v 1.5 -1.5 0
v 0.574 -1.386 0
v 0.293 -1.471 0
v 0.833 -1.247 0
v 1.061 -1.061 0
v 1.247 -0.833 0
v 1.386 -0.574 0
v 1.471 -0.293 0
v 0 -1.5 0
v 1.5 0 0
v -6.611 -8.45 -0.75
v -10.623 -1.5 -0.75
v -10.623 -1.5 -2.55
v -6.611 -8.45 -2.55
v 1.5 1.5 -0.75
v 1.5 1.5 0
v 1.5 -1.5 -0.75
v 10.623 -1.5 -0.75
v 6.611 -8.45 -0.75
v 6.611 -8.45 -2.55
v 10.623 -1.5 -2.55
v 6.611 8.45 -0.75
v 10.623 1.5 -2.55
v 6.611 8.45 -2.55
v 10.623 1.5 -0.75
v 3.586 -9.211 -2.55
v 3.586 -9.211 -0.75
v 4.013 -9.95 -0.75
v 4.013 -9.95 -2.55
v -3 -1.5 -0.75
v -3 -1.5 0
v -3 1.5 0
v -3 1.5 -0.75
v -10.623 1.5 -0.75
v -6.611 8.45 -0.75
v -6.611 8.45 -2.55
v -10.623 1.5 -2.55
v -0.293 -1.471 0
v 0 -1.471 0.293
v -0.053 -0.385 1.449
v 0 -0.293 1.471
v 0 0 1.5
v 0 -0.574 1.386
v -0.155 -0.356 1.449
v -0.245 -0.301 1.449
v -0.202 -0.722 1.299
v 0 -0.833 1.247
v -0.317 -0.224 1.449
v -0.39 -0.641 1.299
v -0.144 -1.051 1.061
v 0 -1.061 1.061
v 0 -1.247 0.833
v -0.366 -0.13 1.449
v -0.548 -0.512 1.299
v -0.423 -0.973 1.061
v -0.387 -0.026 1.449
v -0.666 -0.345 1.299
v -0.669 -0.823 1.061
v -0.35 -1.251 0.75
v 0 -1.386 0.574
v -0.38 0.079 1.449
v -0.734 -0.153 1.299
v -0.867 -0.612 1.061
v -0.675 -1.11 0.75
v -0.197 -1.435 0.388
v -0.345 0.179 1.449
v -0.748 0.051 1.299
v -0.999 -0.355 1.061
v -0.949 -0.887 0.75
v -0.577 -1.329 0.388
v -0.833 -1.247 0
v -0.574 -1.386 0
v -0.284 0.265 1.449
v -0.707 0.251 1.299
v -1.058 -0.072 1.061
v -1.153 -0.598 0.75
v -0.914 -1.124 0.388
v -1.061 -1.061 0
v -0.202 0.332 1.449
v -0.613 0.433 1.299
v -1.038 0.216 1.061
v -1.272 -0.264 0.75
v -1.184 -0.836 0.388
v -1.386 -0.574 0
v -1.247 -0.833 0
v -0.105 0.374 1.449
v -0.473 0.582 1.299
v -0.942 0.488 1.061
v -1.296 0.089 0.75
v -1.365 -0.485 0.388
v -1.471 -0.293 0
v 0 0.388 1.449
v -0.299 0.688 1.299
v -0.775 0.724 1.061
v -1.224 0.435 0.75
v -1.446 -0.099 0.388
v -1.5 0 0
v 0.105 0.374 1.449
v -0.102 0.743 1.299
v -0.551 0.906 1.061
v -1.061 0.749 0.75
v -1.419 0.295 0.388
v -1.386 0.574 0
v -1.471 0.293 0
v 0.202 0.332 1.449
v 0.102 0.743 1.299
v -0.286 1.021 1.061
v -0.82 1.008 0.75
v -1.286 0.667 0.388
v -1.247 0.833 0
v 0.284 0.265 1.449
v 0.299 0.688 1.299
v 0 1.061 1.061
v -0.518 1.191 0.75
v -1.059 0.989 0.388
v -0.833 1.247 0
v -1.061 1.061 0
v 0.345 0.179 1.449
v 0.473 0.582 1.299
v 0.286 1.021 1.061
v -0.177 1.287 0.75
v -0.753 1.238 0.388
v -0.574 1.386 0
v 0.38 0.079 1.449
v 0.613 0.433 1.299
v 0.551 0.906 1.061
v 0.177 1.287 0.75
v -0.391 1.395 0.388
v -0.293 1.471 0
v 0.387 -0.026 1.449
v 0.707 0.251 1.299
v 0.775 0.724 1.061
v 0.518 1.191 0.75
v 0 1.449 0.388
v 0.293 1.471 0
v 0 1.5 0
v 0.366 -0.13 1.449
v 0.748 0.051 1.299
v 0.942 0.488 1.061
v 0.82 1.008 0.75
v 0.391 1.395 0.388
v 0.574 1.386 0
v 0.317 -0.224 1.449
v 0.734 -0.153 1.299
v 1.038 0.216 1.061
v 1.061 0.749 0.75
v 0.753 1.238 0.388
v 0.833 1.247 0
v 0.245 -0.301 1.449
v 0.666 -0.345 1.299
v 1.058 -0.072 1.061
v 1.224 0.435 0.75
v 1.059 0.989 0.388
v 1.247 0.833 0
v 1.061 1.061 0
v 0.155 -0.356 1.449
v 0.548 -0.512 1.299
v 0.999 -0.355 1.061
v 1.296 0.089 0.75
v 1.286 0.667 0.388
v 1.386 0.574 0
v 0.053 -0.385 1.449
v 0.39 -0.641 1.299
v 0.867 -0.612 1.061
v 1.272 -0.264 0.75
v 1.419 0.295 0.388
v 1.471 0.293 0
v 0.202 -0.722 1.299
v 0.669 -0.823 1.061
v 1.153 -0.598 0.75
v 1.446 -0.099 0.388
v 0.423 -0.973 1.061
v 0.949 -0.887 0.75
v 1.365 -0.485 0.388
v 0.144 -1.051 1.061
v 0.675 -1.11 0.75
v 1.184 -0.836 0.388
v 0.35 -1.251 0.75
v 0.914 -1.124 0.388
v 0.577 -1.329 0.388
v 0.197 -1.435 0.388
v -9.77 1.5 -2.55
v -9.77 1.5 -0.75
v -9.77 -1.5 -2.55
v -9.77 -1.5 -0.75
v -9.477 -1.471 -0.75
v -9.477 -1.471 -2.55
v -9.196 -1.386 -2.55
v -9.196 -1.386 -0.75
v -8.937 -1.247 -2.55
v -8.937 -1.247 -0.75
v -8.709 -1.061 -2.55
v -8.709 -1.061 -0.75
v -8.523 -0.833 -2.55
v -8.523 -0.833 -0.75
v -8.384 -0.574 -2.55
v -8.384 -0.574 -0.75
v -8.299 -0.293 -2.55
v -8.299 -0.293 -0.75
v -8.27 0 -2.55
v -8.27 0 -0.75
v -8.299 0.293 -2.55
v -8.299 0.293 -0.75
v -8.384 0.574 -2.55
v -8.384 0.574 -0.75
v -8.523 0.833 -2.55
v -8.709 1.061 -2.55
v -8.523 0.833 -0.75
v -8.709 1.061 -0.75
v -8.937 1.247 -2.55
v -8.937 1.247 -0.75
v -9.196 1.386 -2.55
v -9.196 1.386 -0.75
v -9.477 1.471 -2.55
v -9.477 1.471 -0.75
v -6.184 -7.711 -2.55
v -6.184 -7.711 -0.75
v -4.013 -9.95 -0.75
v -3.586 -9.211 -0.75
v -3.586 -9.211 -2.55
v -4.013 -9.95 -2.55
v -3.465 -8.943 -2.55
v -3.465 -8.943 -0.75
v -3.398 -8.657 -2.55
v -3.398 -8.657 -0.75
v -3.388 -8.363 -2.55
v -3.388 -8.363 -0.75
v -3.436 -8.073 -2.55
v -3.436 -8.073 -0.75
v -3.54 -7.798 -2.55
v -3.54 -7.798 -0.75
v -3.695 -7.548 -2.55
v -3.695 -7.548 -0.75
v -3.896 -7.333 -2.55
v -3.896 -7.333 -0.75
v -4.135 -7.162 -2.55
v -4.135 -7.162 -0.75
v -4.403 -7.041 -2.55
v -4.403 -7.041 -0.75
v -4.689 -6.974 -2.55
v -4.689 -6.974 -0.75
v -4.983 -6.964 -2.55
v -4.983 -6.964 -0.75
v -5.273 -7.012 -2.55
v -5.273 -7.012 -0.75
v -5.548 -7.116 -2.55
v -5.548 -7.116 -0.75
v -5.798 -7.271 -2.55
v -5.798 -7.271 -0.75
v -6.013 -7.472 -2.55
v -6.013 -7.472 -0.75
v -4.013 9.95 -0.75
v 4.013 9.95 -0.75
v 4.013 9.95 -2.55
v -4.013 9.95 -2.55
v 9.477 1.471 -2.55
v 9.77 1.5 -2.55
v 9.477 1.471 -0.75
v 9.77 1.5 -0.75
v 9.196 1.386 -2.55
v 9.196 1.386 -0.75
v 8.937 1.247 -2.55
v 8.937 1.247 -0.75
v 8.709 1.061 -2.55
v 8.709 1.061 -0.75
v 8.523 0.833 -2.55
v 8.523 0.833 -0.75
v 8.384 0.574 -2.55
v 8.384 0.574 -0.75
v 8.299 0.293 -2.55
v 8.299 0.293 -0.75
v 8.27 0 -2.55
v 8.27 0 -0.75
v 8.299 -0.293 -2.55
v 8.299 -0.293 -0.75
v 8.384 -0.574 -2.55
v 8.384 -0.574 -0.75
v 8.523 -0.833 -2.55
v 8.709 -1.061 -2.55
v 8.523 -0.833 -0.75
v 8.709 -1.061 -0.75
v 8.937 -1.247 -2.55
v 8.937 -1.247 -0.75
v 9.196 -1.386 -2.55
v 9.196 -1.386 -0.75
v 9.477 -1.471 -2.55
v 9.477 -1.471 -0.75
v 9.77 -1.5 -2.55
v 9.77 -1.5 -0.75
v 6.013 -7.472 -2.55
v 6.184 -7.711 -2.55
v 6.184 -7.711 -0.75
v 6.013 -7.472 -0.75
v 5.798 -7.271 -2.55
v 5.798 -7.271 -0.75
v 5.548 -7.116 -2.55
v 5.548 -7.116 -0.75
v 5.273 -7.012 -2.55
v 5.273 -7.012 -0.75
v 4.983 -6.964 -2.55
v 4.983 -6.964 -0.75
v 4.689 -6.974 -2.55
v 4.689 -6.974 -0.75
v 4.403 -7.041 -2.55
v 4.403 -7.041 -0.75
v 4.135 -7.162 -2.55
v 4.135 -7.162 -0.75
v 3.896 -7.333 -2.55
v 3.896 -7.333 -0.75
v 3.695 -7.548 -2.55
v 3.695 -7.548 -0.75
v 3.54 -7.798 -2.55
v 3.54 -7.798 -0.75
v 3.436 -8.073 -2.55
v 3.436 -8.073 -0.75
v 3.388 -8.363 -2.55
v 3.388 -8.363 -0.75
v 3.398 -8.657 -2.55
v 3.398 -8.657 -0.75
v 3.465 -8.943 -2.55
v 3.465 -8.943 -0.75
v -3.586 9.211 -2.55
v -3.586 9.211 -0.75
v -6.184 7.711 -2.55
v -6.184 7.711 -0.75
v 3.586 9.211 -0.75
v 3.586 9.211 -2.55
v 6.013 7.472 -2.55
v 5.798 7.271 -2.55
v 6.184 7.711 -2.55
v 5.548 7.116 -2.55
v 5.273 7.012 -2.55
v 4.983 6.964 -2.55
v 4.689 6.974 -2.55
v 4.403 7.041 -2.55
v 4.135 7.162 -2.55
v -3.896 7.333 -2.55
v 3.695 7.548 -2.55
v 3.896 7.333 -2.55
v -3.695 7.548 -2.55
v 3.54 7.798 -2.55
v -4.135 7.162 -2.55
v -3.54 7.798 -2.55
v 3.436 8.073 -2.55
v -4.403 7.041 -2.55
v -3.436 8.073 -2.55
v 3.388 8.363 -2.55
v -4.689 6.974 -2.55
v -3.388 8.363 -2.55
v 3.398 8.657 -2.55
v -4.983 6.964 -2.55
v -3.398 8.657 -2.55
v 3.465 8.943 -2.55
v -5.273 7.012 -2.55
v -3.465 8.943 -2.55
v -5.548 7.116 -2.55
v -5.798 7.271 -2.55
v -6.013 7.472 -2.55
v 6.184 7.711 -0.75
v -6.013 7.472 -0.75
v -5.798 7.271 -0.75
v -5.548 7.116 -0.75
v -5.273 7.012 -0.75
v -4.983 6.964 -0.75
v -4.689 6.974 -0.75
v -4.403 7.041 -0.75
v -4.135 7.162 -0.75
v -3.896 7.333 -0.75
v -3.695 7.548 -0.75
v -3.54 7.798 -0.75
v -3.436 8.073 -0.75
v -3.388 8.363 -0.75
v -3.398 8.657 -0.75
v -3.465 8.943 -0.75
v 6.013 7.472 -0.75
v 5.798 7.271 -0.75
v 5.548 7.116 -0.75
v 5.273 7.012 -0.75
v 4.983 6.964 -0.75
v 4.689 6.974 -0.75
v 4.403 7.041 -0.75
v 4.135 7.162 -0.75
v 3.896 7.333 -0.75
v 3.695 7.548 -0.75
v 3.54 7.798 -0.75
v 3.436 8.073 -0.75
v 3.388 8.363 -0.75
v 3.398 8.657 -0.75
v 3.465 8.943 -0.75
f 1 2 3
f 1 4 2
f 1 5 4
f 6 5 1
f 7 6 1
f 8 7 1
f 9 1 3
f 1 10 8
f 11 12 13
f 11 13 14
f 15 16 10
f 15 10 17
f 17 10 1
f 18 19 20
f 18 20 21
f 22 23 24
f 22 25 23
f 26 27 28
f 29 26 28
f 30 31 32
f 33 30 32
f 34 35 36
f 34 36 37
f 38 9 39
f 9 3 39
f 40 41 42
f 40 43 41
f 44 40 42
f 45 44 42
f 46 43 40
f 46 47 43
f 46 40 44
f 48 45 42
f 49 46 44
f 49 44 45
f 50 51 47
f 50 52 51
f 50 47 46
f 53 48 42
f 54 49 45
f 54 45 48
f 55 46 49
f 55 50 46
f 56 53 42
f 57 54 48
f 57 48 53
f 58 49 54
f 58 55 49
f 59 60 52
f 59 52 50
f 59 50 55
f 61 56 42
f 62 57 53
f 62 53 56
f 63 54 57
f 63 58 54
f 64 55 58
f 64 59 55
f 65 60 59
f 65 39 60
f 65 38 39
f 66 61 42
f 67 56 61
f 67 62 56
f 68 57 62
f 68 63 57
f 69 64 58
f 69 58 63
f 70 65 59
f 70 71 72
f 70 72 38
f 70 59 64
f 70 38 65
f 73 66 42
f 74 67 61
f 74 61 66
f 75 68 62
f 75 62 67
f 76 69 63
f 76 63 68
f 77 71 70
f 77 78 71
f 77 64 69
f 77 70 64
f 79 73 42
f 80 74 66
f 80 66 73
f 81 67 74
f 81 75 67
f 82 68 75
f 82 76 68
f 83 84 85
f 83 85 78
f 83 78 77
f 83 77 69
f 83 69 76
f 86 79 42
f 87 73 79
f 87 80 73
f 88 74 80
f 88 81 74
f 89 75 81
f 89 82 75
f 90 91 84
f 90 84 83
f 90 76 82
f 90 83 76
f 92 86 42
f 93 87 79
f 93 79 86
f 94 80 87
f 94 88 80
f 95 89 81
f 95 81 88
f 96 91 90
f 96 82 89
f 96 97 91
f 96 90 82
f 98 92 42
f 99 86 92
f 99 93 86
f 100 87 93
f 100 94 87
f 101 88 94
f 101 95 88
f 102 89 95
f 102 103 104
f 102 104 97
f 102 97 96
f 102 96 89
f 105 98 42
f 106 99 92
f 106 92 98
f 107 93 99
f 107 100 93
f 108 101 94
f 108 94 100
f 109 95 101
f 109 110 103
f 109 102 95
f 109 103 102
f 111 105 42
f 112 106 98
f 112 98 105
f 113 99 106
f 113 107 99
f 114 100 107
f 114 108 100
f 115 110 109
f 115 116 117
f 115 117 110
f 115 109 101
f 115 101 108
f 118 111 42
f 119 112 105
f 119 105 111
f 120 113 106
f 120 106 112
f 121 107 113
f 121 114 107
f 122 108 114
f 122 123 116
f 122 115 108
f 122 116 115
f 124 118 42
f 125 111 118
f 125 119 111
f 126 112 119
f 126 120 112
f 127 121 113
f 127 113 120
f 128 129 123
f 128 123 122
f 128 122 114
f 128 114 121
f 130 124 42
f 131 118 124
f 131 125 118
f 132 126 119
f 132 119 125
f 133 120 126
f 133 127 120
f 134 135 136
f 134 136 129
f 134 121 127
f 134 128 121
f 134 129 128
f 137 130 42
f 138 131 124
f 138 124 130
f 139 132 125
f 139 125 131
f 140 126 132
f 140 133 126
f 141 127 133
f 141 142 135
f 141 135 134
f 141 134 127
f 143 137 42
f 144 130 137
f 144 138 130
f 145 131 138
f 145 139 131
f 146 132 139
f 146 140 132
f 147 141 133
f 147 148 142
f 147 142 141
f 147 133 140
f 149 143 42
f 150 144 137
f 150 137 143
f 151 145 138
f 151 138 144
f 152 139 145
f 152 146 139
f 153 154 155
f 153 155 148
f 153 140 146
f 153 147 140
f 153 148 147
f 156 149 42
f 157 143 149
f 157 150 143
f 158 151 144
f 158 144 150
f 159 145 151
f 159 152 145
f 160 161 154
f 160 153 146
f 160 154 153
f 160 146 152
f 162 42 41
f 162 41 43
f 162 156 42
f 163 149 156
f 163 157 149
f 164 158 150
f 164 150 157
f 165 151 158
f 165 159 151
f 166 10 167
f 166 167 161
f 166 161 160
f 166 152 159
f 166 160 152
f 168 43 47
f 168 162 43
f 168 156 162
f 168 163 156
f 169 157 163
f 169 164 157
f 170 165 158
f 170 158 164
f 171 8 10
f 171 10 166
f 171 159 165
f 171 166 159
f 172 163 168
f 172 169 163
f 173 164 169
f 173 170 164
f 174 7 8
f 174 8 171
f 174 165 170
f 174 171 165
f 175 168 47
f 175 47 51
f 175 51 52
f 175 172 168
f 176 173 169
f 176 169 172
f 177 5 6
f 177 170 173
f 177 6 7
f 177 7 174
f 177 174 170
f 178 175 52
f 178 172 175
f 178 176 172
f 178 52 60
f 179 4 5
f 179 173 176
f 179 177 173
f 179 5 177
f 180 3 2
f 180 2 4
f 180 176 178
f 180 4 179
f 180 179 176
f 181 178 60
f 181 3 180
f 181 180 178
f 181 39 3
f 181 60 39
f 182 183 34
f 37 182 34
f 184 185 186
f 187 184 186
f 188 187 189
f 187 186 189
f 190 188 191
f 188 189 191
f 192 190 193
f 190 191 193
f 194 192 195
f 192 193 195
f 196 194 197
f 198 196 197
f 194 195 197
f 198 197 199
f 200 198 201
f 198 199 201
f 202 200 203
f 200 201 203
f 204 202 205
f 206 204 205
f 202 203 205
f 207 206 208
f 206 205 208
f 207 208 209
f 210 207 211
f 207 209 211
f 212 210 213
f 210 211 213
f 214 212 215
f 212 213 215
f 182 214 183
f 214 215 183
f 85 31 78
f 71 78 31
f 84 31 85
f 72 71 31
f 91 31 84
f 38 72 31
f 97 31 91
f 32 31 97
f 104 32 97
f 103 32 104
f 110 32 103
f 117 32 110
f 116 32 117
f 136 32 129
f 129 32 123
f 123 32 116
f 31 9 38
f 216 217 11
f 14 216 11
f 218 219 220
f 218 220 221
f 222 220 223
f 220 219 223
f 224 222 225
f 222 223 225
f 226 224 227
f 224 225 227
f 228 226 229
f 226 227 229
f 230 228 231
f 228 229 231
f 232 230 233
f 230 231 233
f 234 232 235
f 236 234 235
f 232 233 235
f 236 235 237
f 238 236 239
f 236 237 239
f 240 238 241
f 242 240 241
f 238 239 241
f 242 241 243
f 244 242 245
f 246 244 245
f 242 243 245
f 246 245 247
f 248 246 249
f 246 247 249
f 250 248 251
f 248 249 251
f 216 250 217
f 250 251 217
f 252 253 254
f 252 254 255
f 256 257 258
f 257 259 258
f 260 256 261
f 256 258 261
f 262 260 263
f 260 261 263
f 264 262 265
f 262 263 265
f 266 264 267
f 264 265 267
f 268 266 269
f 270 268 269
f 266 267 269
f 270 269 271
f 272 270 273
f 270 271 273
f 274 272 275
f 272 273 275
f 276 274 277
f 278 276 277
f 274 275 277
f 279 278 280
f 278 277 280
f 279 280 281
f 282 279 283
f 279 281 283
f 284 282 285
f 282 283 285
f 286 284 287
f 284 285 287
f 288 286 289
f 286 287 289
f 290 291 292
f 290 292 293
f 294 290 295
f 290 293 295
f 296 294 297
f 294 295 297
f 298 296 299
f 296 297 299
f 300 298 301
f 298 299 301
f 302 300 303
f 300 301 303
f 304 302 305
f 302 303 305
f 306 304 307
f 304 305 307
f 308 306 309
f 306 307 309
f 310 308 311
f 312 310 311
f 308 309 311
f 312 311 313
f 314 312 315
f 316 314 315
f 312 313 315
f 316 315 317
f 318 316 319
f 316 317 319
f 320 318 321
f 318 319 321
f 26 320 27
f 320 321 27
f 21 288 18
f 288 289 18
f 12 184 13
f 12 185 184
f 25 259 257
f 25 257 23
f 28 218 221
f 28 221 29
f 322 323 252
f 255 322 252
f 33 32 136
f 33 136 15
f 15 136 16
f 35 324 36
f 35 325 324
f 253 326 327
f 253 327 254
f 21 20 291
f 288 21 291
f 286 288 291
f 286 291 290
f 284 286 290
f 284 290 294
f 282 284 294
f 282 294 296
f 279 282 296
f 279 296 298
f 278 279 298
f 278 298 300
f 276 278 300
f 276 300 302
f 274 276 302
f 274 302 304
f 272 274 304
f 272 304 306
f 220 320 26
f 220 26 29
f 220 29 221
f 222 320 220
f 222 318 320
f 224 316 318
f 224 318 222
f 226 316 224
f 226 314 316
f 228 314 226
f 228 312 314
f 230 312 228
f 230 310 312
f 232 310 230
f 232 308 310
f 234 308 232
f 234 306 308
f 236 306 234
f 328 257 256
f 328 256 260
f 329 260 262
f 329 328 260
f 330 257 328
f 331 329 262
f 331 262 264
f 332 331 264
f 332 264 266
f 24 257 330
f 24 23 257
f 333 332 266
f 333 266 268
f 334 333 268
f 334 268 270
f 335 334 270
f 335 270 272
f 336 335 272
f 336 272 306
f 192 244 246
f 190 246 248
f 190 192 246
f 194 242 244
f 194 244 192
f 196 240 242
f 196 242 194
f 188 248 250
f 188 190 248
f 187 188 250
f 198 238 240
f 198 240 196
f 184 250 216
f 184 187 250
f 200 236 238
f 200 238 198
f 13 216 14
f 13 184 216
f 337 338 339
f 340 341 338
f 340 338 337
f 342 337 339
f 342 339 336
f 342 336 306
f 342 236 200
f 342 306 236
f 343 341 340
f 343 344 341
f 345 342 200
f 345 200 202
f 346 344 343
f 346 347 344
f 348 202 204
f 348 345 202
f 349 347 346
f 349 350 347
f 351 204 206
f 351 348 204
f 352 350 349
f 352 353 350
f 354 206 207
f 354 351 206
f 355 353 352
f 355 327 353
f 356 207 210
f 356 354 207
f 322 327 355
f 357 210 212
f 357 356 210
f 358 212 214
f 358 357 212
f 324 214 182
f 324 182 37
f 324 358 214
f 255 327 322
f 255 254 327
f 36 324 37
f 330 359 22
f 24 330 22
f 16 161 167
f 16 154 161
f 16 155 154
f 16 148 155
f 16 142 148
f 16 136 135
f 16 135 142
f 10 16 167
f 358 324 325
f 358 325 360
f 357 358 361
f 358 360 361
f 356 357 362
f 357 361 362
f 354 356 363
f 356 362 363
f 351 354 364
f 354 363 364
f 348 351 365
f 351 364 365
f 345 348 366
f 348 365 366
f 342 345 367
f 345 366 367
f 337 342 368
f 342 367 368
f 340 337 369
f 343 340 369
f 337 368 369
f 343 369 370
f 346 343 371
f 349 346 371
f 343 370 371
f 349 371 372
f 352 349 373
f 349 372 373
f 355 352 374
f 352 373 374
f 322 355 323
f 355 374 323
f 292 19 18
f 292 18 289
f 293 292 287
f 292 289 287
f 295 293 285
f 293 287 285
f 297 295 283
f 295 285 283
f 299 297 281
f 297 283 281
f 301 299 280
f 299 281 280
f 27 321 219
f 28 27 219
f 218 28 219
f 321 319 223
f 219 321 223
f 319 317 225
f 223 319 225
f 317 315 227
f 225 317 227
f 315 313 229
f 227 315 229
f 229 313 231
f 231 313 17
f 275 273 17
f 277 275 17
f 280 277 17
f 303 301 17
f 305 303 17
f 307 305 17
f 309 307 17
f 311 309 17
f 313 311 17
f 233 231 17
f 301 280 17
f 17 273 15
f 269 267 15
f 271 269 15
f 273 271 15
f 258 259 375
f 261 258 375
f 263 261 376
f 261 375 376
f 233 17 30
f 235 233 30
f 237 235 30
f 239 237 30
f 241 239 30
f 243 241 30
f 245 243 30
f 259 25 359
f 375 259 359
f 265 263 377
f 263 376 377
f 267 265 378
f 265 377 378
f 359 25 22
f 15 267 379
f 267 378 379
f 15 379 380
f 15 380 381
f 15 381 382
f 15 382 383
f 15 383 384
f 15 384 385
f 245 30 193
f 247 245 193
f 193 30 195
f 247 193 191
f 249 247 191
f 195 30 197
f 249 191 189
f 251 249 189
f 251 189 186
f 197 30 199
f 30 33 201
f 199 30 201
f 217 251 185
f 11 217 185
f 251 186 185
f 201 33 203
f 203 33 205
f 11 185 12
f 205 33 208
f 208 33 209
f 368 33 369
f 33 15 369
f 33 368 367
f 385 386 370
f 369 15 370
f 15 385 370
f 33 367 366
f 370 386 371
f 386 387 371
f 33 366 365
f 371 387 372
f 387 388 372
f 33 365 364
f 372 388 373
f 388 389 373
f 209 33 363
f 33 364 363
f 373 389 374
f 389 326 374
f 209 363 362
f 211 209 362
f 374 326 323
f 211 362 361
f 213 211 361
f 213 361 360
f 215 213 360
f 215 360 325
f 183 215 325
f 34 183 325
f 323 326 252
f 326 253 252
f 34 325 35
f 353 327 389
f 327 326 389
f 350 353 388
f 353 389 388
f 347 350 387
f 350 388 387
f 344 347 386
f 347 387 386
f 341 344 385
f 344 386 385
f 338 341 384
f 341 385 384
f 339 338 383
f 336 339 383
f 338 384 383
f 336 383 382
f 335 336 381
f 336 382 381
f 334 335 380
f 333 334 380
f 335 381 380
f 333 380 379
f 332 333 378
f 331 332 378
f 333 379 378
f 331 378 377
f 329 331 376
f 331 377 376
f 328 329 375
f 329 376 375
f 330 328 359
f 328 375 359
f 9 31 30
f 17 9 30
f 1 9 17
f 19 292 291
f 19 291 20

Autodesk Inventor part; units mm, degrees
ref_plane "YZ Plane" through (0, 0, 0) normal (1, 0, 0) x (0, 1, 0)
ref_plane "XZ Plane" through (0, 0, 0) normal (0, 1, 0) x (-1, 0, 0)
ref_plane "XY Plane" through (0, 0, 0) normal (0, 0, 1) x (1, 0, 0)
sketch "Skizze1" plane through (0, 0, 0) normal (0, 0, 1) x (1, 0, 0)
  line L0 (-3, 1.5) -> (1.5, 1.5)
  line L1 (1.5, 1.5) -> (1.5, -1.5)
  line L2 (-3, -1.5) -> (-3, 1.5)
  line L3 (1.5, 1.5) -> (-1.5, -1.5) construction
  line L4 (-1.5, -1.5) -> (1.5, -1.5) construction
  line L5 (0, 0) -> (0.1963, -0.4081) construction
  line L6 (-3, -1.5) -> (1.5, -1.5)
  dimension "d0" = 3
  dimension "d1" = 4.5
extrude "Extrusion1" add sketch "Skizze1" against normal blind 0.75
sketch "Skizze2" plane through (0, 0, 0) normal (1, 0, 0) x (0, 1, 0)
  line L0 (-1.5, 0) -> (1.5, 0) projected
  arc A0 (0, 1.5) -> (-1.5, 0) centre (0, 0) ccw
  line L1 (0, 0) -> (0, 1.5)
  line L2 (0, 0) -> (-1.5, 0)
  dimension "d4" = 1.5
revolve "Umdrehung1" add sketch "Skizze2" angle 360 about axis through (0, 0, 0) along (0, 0, 1)
sketch "Skizze3" plane through (0, 0, -0.75) normal (0, 0, -1) x (-1, 0, 0)
  line L0 (11.4893, 0) -> (5.7446, -9.95)
  line L1 (5.7446, -9.95) -> (-5.7446, -9.95)
  line L2 (-5.7446, -9.95) -> (-11.4893, 0)
  line L3 (-11.4893, 0) -> (-5.7446, 9.95)
  line L4 (-5.7446, 9.95) -> (5.7446, 9.95)
  line L5 (5.7446, 9.95) -> (11.4893, 0)
  point P0 (0, 0)
  point P1 (0, 0)
  dimension "d7" = 19.9
extrude "Extrusion2" add sketch "Skizze3" along normal blind 1.8
sketch "Skizze4" plane through (0, 0, -0.75) normal (0, 0, 1) x (1, 0, 0)
  line L0 (-11.4893, 0) -> (-5.7446, -9.95) projected
  line L1 (-5.7446, 9.95) -> (-11.4893, 0) projected
  line L2 (1.5, -1.5) -> (-3, -1.5) projected
  line L3 (0, 0) -> (-9.77, 0) construction
  arc A0 (-9.77, -1.5) -> (-9.77, 1.5) centre (-9.77, 0) ccw
  line L4 (-9.77, -1.5) -> (-10.6232, -1.5)
  line L5 (-9.77, 1.5) -> (-10.6232, 1.5)
  dimension "d10" = 9.77
  dimension "d11" = 3
extrude "Extrusion3" cut sketch "Skizze4" against normal blind 1.8
pattern_circular "Runde Anordnung1" count 6 over 360 about axis through (0, 0, -10) along (0, 0, 1) of "Extrusion3"
properties part number "Luxeon Rebel Star"
